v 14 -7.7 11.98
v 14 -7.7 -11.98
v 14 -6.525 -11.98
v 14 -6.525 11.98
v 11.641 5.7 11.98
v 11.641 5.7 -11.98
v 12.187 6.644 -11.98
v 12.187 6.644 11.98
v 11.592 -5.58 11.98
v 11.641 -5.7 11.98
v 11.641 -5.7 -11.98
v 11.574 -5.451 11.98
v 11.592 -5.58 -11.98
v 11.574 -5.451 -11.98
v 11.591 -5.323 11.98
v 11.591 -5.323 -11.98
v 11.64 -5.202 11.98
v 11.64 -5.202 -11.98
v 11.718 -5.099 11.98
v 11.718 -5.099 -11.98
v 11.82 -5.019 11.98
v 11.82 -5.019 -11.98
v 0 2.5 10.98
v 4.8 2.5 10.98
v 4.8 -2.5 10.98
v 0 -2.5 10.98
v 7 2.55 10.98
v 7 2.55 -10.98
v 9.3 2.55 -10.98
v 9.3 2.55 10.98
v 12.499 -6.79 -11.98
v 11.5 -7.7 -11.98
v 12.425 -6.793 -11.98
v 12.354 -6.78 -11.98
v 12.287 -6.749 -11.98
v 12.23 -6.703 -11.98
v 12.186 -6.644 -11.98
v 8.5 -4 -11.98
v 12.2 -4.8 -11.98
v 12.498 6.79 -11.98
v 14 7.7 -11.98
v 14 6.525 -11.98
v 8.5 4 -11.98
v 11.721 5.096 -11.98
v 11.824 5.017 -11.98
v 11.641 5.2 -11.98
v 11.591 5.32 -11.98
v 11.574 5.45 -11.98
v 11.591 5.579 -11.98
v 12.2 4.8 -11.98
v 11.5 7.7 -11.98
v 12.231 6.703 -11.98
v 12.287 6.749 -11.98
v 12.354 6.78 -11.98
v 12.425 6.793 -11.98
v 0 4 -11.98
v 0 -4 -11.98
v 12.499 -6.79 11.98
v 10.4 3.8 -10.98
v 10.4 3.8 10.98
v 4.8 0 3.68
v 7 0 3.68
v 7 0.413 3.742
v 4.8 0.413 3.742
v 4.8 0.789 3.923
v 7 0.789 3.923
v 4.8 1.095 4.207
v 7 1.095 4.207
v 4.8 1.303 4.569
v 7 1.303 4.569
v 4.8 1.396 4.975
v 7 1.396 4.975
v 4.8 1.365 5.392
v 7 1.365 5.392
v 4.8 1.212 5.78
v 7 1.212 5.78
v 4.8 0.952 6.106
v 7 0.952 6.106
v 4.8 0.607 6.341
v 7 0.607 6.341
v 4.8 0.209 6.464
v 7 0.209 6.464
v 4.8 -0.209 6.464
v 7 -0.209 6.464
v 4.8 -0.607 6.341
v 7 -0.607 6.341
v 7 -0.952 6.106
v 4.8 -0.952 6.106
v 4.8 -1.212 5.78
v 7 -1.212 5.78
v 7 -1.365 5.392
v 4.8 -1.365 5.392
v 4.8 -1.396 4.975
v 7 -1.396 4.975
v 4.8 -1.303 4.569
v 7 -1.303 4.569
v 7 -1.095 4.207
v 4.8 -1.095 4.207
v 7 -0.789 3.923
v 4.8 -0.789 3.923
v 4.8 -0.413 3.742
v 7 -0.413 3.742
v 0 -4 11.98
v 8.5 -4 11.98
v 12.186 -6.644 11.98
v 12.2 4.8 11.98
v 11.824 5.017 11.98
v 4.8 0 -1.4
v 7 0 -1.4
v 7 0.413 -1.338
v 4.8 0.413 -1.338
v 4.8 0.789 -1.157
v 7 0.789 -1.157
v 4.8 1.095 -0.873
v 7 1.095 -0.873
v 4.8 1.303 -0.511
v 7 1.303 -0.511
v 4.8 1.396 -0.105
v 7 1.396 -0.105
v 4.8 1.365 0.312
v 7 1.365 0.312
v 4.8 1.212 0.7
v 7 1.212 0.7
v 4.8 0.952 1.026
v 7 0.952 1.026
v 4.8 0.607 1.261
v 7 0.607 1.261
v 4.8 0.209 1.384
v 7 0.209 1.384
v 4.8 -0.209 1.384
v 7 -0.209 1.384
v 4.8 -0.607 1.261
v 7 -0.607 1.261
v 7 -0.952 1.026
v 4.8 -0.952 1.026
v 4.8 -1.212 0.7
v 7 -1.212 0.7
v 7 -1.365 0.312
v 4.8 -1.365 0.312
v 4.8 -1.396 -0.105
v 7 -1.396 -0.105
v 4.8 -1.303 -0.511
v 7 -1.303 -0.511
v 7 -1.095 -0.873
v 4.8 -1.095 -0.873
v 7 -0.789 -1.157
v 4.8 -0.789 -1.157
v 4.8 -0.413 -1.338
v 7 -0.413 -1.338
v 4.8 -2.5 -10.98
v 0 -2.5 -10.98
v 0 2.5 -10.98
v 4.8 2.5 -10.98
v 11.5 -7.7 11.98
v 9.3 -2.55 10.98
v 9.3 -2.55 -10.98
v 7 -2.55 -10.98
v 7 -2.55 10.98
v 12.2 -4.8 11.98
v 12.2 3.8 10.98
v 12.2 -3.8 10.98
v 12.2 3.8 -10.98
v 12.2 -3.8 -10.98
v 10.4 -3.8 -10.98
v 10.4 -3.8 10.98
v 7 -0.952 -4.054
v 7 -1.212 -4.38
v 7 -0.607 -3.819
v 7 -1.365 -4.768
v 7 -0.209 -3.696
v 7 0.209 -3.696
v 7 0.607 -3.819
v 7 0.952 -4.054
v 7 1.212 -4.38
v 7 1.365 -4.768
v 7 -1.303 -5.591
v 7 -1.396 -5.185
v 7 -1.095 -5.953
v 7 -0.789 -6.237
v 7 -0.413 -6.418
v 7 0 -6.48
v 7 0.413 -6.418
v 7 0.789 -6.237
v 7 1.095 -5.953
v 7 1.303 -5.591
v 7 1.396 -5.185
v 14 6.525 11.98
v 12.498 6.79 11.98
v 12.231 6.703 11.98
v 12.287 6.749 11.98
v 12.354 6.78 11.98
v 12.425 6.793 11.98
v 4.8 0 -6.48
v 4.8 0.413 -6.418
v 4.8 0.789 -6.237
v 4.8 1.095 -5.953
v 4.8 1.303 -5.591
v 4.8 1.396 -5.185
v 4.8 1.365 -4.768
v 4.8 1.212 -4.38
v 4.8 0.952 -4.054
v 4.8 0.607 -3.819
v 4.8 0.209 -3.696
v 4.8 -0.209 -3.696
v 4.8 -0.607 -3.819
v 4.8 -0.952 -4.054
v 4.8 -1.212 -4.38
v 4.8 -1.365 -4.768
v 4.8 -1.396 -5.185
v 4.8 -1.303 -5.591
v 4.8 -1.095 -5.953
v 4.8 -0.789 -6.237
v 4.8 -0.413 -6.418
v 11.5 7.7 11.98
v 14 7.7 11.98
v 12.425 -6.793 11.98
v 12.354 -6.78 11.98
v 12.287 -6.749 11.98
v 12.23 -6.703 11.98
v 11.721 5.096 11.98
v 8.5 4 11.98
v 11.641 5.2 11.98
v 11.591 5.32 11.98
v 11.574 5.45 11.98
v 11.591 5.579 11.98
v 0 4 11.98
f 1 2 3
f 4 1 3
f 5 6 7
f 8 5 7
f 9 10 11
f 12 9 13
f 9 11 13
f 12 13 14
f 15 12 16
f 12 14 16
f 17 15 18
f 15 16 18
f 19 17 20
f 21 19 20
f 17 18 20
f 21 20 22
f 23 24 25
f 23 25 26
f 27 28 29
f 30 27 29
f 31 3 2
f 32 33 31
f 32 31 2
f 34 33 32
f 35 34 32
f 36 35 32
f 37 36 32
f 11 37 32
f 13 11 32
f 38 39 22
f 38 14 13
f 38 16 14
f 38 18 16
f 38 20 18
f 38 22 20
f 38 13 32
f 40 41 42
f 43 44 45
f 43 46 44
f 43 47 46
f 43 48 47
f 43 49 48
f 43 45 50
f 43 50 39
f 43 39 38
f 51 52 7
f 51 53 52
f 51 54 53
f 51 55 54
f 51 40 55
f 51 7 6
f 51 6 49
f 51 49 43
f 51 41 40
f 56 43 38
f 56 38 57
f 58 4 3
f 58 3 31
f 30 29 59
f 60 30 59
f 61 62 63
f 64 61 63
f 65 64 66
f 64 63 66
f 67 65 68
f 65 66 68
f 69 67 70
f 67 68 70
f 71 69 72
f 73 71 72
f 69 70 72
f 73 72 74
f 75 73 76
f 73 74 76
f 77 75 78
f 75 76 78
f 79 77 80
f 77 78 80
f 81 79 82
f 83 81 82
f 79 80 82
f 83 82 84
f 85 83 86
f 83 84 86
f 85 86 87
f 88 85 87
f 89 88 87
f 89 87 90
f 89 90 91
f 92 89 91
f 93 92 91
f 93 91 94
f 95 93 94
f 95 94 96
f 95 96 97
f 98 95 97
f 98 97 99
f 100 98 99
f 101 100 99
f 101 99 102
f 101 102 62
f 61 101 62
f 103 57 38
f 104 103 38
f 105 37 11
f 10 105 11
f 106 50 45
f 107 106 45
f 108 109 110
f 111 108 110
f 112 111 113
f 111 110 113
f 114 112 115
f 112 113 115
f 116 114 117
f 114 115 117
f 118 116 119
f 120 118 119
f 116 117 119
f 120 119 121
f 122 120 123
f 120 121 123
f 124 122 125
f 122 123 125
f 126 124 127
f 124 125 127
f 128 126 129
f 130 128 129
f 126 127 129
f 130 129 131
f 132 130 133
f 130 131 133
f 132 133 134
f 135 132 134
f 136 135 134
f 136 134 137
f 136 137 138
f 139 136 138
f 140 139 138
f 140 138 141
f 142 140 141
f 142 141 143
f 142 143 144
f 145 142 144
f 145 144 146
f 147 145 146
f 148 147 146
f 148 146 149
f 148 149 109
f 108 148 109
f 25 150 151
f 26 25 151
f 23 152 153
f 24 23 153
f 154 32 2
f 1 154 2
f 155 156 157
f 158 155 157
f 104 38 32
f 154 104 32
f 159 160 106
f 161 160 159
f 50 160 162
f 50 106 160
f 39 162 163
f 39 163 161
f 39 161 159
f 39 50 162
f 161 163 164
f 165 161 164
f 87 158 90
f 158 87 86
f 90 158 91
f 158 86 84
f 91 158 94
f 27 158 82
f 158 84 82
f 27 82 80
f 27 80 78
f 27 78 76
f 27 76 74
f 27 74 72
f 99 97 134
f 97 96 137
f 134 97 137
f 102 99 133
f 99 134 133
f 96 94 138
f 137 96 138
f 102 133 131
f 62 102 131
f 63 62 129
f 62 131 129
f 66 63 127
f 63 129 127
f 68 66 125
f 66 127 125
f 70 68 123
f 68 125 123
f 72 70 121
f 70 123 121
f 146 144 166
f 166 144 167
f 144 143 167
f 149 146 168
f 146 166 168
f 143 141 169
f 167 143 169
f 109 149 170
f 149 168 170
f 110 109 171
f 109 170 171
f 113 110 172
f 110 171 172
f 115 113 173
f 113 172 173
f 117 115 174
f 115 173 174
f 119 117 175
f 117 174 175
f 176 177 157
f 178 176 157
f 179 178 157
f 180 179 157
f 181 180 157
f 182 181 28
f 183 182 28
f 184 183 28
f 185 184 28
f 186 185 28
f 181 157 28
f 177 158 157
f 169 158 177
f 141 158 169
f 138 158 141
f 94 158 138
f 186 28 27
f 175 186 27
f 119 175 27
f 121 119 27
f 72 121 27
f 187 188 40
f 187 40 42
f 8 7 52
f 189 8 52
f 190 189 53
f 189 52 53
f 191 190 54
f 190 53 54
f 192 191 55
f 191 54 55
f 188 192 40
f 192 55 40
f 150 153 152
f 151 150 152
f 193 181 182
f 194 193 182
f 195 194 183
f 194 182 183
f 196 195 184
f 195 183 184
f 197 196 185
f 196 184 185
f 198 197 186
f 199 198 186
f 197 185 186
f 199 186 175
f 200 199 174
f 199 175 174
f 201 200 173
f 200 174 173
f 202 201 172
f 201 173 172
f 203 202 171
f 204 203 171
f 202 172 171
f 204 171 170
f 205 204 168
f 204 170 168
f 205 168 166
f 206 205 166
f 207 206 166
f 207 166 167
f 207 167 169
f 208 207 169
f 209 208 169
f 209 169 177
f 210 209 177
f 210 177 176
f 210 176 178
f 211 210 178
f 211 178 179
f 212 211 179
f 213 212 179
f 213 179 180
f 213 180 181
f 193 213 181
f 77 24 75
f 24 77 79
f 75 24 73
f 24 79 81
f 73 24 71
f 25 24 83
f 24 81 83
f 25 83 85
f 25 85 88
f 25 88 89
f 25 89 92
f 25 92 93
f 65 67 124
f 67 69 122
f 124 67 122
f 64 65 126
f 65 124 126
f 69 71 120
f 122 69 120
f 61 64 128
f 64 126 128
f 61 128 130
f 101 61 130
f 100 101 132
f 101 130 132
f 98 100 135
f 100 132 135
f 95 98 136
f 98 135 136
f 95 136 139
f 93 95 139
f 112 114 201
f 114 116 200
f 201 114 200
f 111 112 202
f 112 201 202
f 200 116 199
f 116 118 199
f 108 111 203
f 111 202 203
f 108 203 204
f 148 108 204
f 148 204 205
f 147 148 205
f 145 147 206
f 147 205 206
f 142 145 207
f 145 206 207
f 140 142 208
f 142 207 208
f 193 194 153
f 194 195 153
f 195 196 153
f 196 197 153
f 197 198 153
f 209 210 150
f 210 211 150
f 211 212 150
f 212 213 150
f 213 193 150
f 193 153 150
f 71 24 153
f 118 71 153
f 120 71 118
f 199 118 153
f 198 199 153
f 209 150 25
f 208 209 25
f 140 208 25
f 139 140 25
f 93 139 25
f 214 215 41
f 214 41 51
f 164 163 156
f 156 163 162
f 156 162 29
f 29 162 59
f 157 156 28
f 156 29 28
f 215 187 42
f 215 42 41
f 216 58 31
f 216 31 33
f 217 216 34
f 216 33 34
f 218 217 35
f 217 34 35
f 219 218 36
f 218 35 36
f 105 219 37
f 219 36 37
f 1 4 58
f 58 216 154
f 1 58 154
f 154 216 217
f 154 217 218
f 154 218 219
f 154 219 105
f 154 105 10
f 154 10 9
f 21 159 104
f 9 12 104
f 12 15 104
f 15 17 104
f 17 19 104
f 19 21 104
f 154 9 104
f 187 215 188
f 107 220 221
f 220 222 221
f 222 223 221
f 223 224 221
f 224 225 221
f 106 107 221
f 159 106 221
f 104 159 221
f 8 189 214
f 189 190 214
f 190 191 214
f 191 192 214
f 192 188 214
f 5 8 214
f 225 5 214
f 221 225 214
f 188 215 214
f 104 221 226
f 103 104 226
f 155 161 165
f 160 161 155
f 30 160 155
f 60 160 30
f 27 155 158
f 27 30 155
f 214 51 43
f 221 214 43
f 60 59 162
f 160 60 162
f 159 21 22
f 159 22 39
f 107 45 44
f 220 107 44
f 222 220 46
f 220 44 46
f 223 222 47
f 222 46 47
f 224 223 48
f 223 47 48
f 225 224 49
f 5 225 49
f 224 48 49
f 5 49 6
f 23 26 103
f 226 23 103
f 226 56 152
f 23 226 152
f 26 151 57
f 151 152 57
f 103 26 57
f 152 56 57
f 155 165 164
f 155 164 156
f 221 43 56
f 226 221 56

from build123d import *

# Parameters (mm, degrees)
BOSS_EXTRU_1_DEPTH      = 11.98
BOSS_EXTRU_1_DEPTH_BACK = 11.98
BOSS_EXTRU_2_DEPTH      = 1
ESQUISSE3_R             = 1.4
ENL_V_MAT_EXTRU_1_DEPTH = 16.868545408


with BuildPart() as part:
    # Esquisse1 → Boss.-Extru.1 (new, two sides: drawn at the far end of the back side and taken through both)
    with BuildSketch(Plane.XY.offset(-BOSS_EXTRU_1_DEPTH_BACK)):
        with BuildLine():
            Line((0, 4), (0, 2.5))
            Line((0, 2.5), (4.8, 2.5))
            Line((4.8, 2.5), (4.8, -2.5))
            Line((4.8, -2.5), (0, -2.5))
            Line((0, -2.5), (0, -4))
            Line((0, -4), (8.500076, -4))
            Line((8.500076, -4), (11.500006965, -7.699978353))
            Line((11.500006965, -7.699978353), (14, -7.699978353))
            Line((14, -7.699978353), (14, -6.524983133))
            Line((14, -6.524983133), (12.498521064, -6.789609096))
            ThreePointArc((12.498521064, -6.789609096), (12.319554673, -6.766083995), (12.186482634, -6.644124034))
            Line((12.186482634, -6.644124034), (11.641375242, -5.699594361))
            ThreePointArc((11.641375242, -5.699594361), (11.590815941, -5.322605229), (11.820116831, -5.019128457))
            Line((11.820116831, -5.019128457), (12.19995, -4.799870197))
            Line((12.19995, -4.799870197), (12.19995, -3.799987301))
            Line((12.19995, -3.799987301), (10.399918669, -3.799987301))
            Line((10.399918669, -3.799987301), (9.3, -2.549913972))
            Line((9.3, -2.549913972), (7, -2.549913972))
            Line((7, -2.549913972), (7, 2.550086028))
            Line((7, 2.550086028), (9.3, 2.550086028))
            Line((9.3, 2.550086028), (10.399918669, 3.800106202))
            Line((10.399918669, 3.800106202), (12.19995, 3.800106202))
            Line((12.19995, 3.800106202), (12.19995, 4.800033133))
            Line((12.19995, 4.800033133), (11.824382637, 5.01686254))
            ThreePointArc((11.824382637, 5.01686254), (11.591449393, 5.320453932), (11.641389736, 5.699837105))
            Line((11.641389736, 5.699837105), (12.186568343, 6.644209348))
            ThreePointArc((12.186568343, 6.644209348), (12.319573629, 6.766106706), (12.4984419, 6.789676051))
            Line((12.4984419, 6.789676051), (14, 6.524983133))
            Line((14, 6.524983133), (14, 7.700021647))
            Line((14, 7.700021647), (11.499988165, 7.700021647))
            Line((11.499988165, 7.700021647), (8.500082, 4))
            Line((8.500082, 4), (0, 4))
        make_face()
    extrude(amount=BOSS_EXTRU_1_DEPTH + BOSS_EXTRU_1_DEPTH_BACK)

    # Esquisse4 → Boss.-Extru.2 (add)
    with BuildSketch(Plane.XY.offset(11.98)):
        Polygon((10.399918669, 3.800106202), (12.19995, 3.800106202), (12.19995, -3.799987301), (10.399918669, -3.799987301), (9.3, -2.549913972), (7, -2.549913972), (0, -2.5), (0, 2.5), (7, 2.550086028), (9.3, 2.550086028), align=None)
    boss_extru_2 = extrude(amount=-BOSS_EXTRU_2_DEPTH)

    # Symétrie1: Boss.-Extru.2 across plane
    add(boss_extru_2.mirror(Plane.XY))

    # Esquisse3 → Enlèv. mat.-Extru.1 (cut, through all)
    with BuildSketch(Plane(origin=(7, 0, 0), x_dir=(0, 0, -1), z_dir=(1, 0, 0))):
        Circle(ESQUISSE3_R)
        with Locations((-5.08, 0)):
            Circle(ESQUISSE3_R)
        with Locations((5.08, 0)):
            Circle(ESQUISSE3_R)
    extrude(amount=-ENL_V_MAT_EXTRU_1_DEPTH, mode=Mode.SUBTRACT)


solid = part.part
